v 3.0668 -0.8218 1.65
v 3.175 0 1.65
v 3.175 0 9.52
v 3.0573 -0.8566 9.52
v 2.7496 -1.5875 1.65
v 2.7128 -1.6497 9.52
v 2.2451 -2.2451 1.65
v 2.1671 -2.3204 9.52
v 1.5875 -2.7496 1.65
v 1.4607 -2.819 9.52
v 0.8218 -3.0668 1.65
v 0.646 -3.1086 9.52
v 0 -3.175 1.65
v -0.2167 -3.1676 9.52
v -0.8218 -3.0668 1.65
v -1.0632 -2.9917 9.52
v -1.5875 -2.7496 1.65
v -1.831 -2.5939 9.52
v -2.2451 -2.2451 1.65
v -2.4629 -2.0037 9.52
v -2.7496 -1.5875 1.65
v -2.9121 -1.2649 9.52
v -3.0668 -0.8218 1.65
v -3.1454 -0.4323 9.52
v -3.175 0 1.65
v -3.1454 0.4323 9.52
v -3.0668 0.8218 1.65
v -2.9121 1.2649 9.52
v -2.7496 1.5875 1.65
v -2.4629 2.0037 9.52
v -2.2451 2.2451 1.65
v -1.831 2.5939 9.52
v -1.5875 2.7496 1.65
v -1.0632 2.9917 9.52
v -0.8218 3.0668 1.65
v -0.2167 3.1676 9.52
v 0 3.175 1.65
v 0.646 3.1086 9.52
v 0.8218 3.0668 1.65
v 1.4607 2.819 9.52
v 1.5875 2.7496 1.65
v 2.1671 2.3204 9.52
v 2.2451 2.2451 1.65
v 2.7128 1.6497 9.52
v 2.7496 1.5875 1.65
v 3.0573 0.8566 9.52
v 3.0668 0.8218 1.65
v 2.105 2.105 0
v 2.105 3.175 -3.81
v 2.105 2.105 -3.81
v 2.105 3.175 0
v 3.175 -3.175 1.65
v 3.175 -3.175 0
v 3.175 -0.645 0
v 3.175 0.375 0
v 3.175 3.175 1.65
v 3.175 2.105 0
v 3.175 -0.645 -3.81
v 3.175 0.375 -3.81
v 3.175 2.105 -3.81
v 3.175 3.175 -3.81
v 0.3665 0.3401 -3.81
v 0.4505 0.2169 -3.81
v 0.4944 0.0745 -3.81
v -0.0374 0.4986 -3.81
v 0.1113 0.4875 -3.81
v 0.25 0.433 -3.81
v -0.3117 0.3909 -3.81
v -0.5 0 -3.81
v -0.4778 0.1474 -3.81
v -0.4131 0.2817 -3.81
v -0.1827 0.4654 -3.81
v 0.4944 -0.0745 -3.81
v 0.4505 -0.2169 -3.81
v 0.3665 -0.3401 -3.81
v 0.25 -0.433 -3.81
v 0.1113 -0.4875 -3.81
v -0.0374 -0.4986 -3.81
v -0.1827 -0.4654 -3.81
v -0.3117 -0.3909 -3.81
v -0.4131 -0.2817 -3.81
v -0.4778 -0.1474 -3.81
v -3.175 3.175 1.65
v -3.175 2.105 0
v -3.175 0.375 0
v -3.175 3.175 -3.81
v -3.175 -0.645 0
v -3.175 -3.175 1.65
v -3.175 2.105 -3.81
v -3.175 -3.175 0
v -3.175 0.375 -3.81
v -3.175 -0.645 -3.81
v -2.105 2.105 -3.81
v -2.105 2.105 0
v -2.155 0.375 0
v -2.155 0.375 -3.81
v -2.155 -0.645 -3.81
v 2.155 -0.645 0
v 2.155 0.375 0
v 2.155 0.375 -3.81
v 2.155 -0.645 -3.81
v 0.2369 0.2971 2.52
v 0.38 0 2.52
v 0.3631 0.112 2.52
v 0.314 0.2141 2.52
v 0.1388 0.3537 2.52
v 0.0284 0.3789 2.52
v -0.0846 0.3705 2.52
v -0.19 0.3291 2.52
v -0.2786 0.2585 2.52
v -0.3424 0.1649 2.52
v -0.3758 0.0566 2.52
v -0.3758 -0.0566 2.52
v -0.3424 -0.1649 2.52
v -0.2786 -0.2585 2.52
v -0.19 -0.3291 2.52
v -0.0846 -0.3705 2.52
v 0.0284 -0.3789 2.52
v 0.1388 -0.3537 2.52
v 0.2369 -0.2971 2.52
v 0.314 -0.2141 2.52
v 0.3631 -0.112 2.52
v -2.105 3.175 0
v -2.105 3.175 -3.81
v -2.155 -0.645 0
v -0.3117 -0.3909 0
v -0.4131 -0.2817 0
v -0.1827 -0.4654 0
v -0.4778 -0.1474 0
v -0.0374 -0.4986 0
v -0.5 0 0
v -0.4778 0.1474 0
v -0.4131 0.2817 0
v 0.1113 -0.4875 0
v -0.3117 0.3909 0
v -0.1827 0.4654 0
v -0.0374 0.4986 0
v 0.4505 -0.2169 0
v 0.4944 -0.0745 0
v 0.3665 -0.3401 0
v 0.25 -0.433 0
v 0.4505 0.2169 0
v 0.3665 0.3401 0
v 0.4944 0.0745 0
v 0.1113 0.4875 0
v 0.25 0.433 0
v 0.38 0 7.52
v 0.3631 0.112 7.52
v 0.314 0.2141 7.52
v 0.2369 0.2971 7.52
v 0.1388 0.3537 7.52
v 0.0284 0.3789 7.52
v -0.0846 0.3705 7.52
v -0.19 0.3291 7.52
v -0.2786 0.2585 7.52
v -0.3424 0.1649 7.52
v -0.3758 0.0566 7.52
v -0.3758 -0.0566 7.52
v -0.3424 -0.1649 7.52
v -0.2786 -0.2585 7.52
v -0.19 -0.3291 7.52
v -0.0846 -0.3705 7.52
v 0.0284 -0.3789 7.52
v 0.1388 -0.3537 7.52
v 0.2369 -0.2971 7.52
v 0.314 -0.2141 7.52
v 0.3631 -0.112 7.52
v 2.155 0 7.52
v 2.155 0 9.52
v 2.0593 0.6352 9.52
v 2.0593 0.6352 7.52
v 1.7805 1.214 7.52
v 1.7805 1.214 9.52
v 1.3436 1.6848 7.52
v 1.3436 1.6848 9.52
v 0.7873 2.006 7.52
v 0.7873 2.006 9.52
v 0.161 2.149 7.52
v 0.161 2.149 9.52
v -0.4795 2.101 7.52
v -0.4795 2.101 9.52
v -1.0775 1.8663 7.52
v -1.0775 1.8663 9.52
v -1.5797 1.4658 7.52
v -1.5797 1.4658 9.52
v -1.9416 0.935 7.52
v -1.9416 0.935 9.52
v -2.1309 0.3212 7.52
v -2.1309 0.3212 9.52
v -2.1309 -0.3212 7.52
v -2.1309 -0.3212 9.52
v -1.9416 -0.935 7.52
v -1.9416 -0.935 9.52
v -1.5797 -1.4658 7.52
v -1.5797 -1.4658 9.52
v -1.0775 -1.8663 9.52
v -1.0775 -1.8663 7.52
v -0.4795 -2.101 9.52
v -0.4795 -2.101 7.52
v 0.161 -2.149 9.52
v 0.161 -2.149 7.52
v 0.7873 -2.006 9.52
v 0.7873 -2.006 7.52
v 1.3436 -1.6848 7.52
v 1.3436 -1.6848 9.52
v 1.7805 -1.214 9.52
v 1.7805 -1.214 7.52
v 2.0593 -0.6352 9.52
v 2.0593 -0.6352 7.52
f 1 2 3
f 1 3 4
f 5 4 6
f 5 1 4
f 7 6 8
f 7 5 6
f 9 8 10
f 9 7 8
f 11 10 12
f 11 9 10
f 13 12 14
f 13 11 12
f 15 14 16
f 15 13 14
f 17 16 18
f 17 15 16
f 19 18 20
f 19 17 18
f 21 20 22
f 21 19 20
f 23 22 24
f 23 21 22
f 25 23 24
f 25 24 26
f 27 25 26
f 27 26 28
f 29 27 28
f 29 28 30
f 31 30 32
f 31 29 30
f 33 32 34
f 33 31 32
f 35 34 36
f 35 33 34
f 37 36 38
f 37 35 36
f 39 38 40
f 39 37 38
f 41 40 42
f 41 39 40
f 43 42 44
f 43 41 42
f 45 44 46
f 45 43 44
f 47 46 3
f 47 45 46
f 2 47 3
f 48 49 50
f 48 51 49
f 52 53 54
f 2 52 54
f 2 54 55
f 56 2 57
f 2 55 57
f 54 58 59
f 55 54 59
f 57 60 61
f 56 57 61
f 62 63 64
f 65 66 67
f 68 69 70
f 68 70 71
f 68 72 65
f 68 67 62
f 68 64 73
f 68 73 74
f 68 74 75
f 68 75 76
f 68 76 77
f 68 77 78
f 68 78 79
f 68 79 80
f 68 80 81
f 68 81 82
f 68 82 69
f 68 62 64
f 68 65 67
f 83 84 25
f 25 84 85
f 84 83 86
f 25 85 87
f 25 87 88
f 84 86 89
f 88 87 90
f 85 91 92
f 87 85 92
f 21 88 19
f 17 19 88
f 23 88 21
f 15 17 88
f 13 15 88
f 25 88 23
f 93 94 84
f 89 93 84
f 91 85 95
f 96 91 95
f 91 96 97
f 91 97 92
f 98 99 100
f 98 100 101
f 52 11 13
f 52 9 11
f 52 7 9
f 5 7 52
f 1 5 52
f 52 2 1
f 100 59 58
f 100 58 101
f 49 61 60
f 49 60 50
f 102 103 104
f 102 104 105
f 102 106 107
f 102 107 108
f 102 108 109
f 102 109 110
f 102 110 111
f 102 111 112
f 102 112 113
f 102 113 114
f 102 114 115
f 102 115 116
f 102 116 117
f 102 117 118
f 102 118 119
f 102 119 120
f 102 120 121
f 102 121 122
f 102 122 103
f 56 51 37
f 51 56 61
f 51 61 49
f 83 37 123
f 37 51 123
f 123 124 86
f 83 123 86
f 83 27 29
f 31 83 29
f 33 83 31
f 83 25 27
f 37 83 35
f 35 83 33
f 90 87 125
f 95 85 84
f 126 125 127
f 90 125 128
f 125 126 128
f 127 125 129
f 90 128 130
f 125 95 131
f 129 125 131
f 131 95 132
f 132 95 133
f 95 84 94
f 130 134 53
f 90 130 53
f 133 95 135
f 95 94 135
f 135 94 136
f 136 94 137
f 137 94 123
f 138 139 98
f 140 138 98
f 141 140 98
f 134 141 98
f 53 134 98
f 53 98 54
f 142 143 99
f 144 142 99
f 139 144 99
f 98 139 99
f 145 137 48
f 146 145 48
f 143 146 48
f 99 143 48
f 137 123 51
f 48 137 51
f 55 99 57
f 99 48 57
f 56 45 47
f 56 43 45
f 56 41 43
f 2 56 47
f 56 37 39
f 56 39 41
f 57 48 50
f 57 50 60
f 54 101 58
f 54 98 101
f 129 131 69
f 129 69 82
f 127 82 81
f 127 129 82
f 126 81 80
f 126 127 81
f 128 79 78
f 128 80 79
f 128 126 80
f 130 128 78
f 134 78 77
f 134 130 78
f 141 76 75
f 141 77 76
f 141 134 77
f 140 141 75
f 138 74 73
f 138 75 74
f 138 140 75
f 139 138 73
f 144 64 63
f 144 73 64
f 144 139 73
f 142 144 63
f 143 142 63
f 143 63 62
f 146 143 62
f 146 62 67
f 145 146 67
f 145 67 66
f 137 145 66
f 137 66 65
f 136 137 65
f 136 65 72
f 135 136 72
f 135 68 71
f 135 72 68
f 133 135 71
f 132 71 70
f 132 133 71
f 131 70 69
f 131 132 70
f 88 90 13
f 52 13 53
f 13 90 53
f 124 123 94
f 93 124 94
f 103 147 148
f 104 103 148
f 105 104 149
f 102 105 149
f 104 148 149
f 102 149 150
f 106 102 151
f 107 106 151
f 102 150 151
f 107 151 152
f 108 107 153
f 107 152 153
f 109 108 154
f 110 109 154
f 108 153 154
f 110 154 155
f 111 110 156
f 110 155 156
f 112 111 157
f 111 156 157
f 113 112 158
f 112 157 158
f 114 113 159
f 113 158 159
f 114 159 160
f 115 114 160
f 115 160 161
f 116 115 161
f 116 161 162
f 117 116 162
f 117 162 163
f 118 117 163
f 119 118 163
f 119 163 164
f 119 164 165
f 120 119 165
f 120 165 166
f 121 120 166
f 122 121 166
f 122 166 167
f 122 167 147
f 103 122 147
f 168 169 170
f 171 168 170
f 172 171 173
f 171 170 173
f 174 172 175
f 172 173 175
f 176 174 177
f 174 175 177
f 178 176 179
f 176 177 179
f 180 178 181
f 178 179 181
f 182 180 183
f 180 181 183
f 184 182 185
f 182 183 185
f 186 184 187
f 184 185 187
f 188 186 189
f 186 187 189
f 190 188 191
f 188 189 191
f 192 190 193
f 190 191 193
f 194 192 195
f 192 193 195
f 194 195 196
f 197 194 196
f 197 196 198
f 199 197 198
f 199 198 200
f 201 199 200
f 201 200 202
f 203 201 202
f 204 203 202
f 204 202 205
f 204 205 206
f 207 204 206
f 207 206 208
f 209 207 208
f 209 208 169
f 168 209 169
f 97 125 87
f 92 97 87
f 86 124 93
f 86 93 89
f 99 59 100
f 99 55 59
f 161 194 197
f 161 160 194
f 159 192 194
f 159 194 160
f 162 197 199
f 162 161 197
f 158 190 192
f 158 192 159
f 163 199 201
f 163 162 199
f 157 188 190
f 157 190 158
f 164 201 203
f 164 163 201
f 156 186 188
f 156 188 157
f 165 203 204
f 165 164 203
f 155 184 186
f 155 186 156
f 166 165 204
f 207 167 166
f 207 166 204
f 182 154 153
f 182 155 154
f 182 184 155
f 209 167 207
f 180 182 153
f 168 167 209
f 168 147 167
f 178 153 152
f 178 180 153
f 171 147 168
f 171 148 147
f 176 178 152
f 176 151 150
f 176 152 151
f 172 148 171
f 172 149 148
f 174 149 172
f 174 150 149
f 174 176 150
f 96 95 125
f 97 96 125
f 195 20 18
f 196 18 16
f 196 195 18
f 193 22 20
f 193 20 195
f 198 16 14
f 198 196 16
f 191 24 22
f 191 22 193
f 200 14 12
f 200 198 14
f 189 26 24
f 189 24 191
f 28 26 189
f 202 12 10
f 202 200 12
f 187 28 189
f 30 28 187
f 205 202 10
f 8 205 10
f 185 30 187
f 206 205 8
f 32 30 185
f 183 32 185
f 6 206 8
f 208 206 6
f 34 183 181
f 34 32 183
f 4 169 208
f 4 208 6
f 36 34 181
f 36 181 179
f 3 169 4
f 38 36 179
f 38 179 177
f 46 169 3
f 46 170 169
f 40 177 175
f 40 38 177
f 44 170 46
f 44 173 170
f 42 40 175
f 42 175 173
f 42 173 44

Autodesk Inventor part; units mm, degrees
ref_plane "YZ Plane" through (0, 0, 0) normal (1, 0, 0) x (0, 1, 0)
ref_plane "XZ Plane" through (0, 0, 0) normal (0, 1, 0) x (-1, 0, 0)
ref_plane "XY Plane" through (0, 0, 0) normal (0, 0, 1) x (1, 0, 0)
sketch "Skizze1" plane through (0, 0, 0) normal (0, 0, 1) x (1, 0, 0)
  line L0 (-3.175, -3.175) -> (3.175, -3.175)
  line L1 (3.175, -3.175) -> (3.175, 3.175)
  line L2 (3.175, 3.175) -> (-3.175, 3.175)
  line L3 (-3.175, 3.175) -> (-3.175, -3.175)
  line L4 (-3.175, -3.175) -> (3.175, 3.175) construction
  line L5 (3.175, -3.175) -> (-3.175, 3.175) construction
  point P0 (0, 0)
  dimension "d0" = 6.35
  dimension "d1" = 6.35
extrude "Extrusion1" add sketch "Skizze1" along normal blind 1.65
sketch "Skizze2" plane through (0, 0, 1.65) normal (0, 0, 1) x (1, 0, 0)
  circle A0 centre (0, 0) radius 3.175
  dimension "d4" = 6.35
extrude "Extrusion2" add sketch "Skizze2" along normal blind 7.87
sketch "Skizze3" plane through (0, 0, 9.52) normal (0, 0, 1) x (1, 0, 0)
  circle A0 centre (0, 0) radius 2.155
  dimension "d7" = 4.31
extrude "Extrusion3" cut sketch "Skizze3" against normal blind 2
sketch "Skizze4" plane through (0, 0, 7.52) normal (0, 0, 1) x (1, 0, 0)
  circle A0 centre (0, 0) radius 0.38
  dimension "d10" = 0.76
extrude "Extrusion4" cut sketch "Skizze4" against normal blind 5
thread "Gewinde1" size "1/4-36 UNS" class "2A" standard "ANSI Unified Screw Threads" length 4 offset 3
sketch "Skizze5" plane through (0, 0, 0) normal (0, 0, -1) x (-1, 0, 0)
  circle A0 centre (0, 0) radius 0.5
  dimension "d15" = 1
extrude "Extrusion5" add sketch "Skizze5" along normal blind 3.81
sketch "Skizze6" plane through (0, 0, 0) normal (0, 0, -1) x (-1, 0, 0)
  line L0 (0, -4.445) -> (0, 4.445) projected
  line L1 (3.175, 3.175) -> (3.175, 0) projected
  arc A0 (-3.175, 0) -> (0, -3.175) centre (0, 0) ccw projected
  line L2 (3.175, 3.175) -> (2.105, 3.175)
  line L3 (2.105, 3.175) -> (2.105, 2.105)
  line L4 (2.105, 2.105) -> (3.175, 2.105)
  line L5 (3.175, 2.105) -> (3.175, 3.175)
  line L6 (-3.175, 3.175) -> (-2.105, 3.175)
  line L7 (-2.105, 3.175) -> (-2.105, 2.105)
  line L8 (-2.105, 2.105) -> (-3.175, 2.105)
  line L9 (-3.175, 2.105) -> (-3.175, 3.175)
  line L10 (-3.175, 3.175) -> (3.175, 3.175) projected
  line L11 (3.175, 0.375) -> (2.155, 0.375)
  line L12 (2.155, 0.375) -> (2.155, -0.645)
  line L13 (2.155, -0.645) -> (3.175, -0.645)
  line L14 (3.175, -0.645) -> (3.175, 0.375)
  line L15 (-3.175, -3.175) -> (-3.175, 3.175) projected
  line L16 (-3.175, 0.375) -> (-2.155, 0.375)
  line L17 (-2.155, 0.375) -> (-2.155, -0.645)
  line L18 (-2.155, -0.645) -> (-3.175, -0.645)
  line L19 (-3.175, -0.645) -> (-3.175, 0.375)
  dimension "d22" = 1.07
  dimension "d23" = 1.07
  dimension "d24" = 1.07
  dimension "d25" = 1.07
  dimension "d28" = 1.02
  dimension "d29" = 1.02
  dimension "d30" = 1.02
  dimension "d31" = 1.02
  dimension "d32" = 1.73
extrude "Extrusion6" add sketch "Skizze6" along normal blind 3.81 contours L1 L14 L13 L12 L11 | L2 L1 L4 L3 | L18 L15 A0 | A0 L15 L16 L17 L18 | L7 L8 L9 L6
properties part number "CON-SMA-EDGE-S" material "Messing, weicher Gelbton"
